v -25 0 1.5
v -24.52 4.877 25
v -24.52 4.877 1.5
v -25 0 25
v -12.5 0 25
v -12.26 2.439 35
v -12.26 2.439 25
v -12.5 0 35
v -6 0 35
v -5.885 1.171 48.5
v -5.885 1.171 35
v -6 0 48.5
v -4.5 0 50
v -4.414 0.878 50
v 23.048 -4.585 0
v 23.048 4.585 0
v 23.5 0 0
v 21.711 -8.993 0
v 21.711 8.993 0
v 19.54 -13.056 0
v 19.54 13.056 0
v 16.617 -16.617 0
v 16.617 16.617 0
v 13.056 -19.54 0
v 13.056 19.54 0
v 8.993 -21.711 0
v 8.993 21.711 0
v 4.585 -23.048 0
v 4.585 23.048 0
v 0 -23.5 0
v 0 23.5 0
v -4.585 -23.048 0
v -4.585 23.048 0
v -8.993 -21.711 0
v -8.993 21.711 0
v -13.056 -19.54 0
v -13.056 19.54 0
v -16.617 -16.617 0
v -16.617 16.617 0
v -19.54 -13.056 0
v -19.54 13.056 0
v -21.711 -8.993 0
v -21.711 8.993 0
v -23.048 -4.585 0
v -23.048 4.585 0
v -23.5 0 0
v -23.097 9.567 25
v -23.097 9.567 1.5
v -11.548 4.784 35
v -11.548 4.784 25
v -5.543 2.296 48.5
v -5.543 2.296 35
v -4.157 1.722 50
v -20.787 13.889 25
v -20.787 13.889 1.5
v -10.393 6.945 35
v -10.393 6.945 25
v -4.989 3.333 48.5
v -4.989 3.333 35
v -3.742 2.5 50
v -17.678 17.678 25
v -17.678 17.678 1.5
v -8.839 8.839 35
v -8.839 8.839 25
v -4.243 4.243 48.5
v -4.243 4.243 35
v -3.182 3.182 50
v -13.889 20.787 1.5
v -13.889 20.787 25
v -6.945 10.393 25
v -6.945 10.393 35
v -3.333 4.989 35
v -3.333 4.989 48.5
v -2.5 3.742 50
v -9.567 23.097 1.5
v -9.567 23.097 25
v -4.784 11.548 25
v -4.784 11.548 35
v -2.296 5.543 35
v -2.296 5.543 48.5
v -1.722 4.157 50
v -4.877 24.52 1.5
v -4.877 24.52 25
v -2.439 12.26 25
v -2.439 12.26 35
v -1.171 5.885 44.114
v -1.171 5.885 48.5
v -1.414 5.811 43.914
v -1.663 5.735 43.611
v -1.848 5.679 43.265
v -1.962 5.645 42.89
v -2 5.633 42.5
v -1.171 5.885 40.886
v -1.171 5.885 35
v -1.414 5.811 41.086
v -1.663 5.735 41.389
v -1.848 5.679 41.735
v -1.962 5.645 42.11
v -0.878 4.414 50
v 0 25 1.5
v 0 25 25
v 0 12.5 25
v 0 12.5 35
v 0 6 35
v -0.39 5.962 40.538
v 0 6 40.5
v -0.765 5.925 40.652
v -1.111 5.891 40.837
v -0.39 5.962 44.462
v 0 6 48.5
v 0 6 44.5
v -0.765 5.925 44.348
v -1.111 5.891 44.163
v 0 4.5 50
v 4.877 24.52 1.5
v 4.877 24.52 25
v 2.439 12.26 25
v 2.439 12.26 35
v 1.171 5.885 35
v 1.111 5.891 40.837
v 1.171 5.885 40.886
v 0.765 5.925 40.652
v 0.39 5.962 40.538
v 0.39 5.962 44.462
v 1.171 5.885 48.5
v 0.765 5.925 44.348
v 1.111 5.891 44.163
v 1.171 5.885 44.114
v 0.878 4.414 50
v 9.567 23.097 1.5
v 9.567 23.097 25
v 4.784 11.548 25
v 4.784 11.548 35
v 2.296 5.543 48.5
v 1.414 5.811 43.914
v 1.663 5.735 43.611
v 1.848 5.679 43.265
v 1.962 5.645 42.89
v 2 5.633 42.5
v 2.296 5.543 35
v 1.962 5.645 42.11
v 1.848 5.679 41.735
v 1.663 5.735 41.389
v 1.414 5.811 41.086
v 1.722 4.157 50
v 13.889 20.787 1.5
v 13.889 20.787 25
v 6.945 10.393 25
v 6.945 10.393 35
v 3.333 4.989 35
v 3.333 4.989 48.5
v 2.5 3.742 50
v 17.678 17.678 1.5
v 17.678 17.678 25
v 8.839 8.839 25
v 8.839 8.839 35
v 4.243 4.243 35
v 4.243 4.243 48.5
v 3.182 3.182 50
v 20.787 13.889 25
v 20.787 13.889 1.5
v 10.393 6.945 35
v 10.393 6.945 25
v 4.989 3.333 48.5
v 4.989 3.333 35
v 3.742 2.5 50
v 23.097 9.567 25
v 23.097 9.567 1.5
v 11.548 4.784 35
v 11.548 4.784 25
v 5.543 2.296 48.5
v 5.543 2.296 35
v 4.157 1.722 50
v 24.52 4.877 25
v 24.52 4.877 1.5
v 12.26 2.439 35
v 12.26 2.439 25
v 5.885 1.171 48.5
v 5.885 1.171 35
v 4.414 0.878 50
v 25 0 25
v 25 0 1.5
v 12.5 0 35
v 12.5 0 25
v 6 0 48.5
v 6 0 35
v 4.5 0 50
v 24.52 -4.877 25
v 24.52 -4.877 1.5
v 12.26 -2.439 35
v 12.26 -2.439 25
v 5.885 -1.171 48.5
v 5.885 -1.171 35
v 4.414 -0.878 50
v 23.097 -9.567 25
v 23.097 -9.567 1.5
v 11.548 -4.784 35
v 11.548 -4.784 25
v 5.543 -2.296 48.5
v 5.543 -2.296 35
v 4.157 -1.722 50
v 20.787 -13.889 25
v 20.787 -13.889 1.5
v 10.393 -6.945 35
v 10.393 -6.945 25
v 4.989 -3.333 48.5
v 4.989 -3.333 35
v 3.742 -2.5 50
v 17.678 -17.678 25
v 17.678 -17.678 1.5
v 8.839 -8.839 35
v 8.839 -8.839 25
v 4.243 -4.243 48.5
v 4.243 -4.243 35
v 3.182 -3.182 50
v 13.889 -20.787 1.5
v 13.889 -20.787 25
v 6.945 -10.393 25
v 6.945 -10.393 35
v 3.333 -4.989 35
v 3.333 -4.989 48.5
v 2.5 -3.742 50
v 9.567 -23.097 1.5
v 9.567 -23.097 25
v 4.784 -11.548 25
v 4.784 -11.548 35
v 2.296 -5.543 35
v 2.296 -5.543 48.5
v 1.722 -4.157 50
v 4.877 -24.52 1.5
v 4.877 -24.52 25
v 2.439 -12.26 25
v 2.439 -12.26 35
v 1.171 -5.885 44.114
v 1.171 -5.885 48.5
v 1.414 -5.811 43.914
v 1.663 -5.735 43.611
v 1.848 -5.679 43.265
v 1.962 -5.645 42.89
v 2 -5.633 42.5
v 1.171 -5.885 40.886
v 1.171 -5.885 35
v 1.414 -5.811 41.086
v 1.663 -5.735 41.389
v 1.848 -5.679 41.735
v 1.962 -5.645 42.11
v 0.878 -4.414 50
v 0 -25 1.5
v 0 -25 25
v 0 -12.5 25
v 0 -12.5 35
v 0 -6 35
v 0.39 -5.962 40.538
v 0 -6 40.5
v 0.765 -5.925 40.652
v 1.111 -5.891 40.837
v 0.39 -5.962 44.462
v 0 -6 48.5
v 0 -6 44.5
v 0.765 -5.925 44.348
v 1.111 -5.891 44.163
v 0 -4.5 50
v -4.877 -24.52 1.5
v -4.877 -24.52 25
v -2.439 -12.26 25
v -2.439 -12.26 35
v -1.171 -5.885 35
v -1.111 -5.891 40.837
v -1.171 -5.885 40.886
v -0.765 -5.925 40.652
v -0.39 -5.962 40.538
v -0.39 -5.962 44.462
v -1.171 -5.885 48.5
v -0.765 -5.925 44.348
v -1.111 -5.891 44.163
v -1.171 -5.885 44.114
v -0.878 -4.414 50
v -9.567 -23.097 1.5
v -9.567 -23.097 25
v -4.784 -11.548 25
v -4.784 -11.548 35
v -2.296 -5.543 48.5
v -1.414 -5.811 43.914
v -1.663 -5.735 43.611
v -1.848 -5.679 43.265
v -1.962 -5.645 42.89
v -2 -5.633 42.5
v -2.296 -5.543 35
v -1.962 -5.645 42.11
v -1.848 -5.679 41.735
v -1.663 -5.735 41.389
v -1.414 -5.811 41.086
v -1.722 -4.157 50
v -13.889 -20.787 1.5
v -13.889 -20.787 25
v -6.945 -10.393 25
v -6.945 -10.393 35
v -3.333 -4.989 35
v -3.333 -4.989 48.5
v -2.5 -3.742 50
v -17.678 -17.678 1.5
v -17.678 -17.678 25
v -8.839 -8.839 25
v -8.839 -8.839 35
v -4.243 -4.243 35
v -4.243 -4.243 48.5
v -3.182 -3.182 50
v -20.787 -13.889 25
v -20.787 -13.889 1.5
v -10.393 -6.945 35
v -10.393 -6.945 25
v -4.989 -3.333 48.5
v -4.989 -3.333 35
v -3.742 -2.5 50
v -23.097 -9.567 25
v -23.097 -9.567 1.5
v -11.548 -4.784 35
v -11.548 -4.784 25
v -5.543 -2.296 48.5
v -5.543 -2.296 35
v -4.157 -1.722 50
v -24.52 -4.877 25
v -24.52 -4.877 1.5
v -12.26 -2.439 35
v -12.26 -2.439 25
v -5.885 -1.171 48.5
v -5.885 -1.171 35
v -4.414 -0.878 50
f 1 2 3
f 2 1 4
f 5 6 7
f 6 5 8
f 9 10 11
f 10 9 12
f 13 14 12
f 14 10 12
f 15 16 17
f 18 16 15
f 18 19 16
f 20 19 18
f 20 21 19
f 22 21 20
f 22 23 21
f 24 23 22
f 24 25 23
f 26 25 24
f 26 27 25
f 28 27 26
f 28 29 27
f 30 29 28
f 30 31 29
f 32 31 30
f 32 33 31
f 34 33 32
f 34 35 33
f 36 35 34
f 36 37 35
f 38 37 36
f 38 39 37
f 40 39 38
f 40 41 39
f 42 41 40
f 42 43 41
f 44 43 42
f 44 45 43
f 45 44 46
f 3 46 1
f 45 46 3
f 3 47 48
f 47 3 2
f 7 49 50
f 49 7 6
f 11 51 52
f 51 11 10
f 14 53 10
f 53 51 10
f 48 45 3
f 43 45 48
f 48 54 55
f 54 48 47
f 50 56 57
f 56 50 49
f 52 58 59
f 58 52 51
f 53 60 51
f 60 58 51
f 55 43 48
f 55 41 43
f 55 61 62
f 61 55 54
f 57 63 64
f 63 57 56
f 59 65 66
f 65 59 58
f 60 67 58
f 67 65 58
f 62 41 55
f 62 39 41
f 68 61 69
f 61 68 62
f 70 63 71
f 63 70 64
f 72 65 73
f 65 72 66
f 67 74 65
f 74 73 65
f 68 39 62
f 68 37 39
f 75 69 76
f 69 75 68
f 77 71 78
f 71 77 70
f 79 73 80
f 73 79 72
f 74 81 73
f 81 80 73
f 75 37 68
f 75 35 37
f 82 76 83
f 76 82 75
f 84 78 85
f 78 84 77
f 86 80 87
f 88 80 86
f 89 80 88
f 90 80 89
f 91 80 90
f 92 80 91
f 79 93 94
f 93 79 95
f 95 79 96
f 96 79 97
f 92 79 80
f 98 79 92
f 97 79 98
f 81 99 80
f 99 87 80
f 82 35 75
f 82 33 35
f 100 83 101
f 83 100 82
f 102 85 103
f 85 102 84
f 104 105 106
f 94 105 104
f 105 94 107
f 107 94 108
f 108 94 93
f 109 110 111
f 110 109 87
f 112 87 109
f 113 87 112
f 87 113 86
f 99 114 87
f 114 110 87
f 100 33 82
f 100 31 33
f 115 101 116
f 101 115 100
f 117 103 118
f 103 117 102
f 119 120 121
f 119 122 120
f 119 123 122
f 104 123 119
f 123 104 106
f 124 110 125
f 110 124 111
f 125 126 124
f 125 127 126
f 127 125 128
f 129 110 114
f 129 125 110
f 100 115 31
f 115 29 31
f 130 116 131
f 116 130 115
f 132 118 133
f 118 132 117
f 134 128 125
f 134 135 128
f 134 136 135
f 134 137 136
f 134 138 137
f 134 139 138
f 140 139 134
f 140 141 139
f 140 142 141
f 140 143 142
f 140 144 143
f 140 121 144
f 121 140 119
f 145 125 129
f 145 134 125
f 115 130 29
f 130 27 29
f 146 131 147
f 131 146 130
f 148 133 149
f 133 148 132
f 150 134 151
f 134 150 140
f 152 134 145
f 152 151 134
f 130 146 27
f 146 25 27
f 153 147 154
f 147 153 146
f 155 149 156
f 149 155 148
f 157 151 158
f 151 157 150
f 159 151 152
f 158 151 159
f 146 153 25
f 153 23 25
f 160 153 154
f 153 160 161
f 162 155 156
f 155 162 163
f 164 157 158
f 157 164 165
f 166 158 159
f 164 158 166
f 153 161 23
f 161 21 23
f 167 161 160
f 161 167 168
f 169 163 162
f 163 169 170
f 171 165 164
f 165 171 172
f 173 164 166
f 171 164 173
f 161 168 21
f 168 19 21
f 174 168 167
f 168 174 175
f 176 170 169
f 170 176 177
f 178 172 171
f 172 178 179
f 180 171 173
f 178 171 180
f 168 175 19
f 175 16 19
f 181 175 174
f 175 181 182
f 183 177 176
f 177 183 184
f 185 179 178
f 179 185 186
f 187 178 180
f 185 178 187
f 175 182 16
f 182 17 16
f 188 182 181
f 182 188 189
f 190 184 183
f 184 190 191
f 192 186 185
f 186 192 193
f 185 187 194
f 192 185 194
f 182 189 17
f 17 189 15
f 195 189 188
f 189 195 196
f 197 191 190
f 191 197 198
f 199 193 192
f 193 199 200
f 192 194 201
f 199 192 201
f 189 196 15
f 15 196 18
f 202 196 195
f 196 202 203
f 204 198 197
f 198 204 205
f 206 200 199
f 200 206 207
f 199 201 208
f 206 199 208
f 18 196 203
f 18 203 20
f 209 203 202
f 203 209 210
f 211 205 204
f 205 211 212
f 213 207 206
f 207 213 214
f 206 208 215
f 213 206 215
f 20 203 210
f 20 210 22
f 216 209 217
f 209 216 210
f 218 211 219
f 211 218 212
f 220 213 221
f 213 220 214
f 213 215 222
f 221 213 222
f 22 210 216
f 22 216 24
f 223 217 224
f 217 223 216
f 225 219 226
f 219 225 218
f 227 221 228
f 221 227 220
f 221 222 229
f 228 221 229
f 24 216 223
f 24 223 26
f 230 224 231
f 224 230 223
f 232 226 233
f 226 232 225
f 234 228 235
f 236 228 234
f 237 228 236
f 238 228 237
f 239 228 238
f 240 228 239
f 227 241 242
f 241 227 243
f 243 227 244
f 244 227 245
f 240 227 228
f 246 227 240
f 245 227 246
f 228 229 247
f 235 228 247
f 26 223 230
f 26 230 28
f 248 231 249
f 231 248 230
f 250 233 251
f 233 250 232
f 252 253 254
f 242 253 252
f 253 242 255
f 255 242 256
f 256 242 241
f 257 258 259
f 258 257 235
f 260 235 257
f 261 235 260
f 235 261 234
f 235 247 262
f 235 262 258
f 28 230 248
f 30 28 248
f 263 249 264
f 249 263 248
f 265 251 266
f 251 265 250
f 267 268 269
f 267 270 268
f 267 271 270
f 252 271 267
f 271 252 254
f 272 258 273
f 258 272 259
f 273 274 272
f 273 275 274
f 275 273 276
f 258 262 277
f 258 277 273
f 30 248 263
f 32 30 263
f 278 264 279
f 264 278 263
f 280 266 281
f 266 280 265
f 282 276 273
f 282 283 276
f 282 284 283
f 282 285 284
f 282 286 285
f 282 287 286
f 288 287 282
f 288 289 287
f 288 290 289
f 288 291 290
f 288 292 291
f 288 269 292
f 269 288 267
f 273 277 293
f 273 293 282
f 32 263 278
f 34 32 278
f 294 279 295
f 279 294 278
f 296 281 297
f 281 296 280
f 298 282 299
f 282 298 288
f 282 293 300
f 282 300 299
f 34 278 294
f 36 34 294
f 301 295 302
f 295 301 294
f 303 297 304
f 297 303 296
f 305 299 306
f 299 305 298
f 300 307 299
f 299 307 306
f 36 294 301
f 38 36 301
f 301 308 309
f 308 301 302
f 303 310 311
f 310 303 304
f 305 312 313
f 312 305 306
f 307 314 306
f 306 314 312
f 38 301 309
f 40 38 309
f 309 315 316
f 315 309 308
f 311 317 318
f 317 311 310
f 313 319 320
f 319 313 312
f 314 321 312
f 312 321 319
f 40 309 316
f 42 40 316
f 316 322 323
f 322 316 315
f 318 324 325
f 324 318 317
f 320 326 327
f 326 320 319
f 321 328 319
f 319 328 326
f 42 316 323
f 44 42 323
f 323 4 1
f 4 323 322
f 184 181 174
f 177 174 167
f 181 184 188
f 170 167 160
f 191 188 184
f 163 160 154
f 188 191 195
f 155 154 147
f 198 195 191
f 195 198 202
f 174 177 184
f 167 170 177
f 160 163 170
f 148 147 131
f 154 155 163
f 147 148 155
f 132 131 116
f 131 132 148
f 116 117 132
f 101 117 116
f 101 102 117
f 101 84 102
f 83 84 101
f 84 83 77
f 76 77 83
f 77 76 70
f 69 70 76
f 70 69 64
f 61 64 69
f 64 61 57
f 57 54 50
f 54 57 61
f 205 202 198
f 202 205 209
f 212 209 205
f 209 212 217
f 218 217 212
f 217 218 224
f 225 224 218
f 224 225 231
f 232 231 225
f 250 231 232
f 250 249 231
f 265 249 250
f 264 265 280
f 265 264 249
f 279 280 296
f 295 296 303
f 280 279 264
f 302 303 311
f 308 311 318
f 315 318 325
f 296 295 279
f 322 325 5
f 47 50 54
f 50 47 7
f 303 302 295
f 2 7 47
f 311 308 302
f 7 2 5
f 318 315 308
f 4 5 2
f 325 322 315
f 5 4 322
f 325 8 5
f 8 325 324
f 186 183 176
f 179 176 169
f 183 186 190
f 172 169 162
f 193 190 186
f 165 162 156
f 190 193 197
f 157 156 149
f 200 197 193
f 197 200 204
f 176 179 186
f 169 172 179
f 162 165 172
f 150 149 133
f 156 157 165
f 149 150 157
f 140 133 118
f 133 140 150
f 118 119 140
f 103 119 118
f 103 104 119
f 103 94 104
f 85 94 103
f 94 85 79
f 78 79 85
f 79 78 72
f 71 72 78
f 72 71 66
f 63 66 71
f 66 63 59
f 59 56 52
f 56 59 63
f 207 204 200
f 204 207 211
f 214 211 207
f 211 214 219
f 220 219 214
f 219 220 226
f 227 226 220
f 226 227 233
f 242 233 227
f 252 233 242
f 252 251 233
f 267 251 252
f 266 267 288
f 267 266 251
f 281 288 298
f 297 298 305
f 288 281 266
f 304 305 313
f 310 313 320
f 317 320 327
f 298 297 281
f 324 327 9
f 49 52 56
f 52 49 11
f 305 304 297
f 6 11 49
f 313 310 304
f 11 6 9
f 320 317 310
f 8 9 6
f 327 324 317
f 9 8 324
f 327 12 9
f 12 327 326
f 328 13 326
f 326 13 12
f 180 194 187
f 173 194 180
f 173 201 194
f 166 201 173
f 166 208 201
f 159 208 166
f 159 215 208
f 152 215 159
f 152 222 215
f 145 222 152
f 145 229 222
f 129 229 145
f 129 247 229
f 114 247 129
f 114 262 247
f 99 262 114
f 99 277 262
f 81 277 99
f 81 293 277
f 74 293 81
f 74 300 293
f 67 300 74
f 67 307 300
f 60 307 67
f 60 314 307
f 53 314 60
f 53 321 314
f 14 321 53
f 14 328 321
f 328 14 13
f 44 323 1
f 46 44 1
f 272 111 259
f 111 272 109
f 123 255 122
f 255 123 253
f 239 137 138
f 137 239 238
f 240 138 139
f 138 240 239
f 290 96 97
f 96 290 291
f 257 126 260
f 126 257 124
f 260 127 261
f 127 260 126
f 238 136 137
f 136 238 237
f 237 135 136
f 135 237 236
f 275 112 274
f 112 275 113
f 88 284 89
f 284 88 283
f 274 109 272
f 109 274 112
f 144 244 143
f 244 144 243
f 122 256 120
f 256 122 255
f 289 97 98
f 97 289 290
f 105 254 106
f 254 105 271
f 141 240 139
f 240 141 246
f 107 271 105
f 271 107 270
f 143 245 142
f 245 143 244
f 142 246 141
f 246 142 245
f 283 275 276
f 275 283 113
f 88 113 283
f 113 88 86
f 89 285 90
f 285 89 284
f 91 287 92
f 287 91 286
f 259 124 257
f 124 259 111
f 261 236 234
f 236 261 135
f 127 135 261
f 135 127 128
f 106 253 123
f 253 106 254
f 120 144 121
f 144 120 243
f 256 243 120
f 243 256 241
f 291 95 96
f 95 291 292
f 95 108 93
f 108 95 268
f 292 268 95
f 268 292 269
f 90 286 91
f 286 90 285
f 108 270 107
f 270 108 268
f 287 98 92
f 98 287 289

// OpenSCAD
$fn = 32;

// ----------------------------------------------------------------------
// Stepped shaft: diameters 50, 25, 12 mm, 50 mm long
// ----------------------------------------------------------------------

// --- parameters (mm) ---
d1 = 50;                  // step 1 diameter
len1 = 25;                // step 1 length
d2 = 25;                  // step 2 diameter
len2 = 10;                // step 2 length
d3 = 12;                  // step 3 diameter
len3 = 15;                // step 3 length
total = 50;               // overall length
chamfer = 1.5;            // end chamfer
key_w = 5;                // keyway width
key_d = 2.5;              // keyway depth
key_len = 19;             // keyway length
key_z = 28;               // keyway start along the shaft
cross_d = 4;              // cross pin hole
cross_z = 42.5;           // cross hole position

/* closed turning profile: x is the radius, y is the length */
profile = [[0, 0], [25 - chamfer, 0], [25, chamfer], [25, 25], [12.5, 25], [12.5, 35], [6, 35], [6, 48.5], [4.5, 50], [0, 50]];

difference() {
  rotate_extrude() polygon(profile);
  /* keyway milled into the top of the largest step */
  translate([d1 / 2 - key_d, -key_w / 2, key_z]) cube([key_d + 1, key_w, key_len]);
  /* cross pin hole through the small step */
  translate([0, 0, cross_z]) rotate([90, 0, 0]) cylinder(h = d3 + 4, d = cross_d, center = true);
}
